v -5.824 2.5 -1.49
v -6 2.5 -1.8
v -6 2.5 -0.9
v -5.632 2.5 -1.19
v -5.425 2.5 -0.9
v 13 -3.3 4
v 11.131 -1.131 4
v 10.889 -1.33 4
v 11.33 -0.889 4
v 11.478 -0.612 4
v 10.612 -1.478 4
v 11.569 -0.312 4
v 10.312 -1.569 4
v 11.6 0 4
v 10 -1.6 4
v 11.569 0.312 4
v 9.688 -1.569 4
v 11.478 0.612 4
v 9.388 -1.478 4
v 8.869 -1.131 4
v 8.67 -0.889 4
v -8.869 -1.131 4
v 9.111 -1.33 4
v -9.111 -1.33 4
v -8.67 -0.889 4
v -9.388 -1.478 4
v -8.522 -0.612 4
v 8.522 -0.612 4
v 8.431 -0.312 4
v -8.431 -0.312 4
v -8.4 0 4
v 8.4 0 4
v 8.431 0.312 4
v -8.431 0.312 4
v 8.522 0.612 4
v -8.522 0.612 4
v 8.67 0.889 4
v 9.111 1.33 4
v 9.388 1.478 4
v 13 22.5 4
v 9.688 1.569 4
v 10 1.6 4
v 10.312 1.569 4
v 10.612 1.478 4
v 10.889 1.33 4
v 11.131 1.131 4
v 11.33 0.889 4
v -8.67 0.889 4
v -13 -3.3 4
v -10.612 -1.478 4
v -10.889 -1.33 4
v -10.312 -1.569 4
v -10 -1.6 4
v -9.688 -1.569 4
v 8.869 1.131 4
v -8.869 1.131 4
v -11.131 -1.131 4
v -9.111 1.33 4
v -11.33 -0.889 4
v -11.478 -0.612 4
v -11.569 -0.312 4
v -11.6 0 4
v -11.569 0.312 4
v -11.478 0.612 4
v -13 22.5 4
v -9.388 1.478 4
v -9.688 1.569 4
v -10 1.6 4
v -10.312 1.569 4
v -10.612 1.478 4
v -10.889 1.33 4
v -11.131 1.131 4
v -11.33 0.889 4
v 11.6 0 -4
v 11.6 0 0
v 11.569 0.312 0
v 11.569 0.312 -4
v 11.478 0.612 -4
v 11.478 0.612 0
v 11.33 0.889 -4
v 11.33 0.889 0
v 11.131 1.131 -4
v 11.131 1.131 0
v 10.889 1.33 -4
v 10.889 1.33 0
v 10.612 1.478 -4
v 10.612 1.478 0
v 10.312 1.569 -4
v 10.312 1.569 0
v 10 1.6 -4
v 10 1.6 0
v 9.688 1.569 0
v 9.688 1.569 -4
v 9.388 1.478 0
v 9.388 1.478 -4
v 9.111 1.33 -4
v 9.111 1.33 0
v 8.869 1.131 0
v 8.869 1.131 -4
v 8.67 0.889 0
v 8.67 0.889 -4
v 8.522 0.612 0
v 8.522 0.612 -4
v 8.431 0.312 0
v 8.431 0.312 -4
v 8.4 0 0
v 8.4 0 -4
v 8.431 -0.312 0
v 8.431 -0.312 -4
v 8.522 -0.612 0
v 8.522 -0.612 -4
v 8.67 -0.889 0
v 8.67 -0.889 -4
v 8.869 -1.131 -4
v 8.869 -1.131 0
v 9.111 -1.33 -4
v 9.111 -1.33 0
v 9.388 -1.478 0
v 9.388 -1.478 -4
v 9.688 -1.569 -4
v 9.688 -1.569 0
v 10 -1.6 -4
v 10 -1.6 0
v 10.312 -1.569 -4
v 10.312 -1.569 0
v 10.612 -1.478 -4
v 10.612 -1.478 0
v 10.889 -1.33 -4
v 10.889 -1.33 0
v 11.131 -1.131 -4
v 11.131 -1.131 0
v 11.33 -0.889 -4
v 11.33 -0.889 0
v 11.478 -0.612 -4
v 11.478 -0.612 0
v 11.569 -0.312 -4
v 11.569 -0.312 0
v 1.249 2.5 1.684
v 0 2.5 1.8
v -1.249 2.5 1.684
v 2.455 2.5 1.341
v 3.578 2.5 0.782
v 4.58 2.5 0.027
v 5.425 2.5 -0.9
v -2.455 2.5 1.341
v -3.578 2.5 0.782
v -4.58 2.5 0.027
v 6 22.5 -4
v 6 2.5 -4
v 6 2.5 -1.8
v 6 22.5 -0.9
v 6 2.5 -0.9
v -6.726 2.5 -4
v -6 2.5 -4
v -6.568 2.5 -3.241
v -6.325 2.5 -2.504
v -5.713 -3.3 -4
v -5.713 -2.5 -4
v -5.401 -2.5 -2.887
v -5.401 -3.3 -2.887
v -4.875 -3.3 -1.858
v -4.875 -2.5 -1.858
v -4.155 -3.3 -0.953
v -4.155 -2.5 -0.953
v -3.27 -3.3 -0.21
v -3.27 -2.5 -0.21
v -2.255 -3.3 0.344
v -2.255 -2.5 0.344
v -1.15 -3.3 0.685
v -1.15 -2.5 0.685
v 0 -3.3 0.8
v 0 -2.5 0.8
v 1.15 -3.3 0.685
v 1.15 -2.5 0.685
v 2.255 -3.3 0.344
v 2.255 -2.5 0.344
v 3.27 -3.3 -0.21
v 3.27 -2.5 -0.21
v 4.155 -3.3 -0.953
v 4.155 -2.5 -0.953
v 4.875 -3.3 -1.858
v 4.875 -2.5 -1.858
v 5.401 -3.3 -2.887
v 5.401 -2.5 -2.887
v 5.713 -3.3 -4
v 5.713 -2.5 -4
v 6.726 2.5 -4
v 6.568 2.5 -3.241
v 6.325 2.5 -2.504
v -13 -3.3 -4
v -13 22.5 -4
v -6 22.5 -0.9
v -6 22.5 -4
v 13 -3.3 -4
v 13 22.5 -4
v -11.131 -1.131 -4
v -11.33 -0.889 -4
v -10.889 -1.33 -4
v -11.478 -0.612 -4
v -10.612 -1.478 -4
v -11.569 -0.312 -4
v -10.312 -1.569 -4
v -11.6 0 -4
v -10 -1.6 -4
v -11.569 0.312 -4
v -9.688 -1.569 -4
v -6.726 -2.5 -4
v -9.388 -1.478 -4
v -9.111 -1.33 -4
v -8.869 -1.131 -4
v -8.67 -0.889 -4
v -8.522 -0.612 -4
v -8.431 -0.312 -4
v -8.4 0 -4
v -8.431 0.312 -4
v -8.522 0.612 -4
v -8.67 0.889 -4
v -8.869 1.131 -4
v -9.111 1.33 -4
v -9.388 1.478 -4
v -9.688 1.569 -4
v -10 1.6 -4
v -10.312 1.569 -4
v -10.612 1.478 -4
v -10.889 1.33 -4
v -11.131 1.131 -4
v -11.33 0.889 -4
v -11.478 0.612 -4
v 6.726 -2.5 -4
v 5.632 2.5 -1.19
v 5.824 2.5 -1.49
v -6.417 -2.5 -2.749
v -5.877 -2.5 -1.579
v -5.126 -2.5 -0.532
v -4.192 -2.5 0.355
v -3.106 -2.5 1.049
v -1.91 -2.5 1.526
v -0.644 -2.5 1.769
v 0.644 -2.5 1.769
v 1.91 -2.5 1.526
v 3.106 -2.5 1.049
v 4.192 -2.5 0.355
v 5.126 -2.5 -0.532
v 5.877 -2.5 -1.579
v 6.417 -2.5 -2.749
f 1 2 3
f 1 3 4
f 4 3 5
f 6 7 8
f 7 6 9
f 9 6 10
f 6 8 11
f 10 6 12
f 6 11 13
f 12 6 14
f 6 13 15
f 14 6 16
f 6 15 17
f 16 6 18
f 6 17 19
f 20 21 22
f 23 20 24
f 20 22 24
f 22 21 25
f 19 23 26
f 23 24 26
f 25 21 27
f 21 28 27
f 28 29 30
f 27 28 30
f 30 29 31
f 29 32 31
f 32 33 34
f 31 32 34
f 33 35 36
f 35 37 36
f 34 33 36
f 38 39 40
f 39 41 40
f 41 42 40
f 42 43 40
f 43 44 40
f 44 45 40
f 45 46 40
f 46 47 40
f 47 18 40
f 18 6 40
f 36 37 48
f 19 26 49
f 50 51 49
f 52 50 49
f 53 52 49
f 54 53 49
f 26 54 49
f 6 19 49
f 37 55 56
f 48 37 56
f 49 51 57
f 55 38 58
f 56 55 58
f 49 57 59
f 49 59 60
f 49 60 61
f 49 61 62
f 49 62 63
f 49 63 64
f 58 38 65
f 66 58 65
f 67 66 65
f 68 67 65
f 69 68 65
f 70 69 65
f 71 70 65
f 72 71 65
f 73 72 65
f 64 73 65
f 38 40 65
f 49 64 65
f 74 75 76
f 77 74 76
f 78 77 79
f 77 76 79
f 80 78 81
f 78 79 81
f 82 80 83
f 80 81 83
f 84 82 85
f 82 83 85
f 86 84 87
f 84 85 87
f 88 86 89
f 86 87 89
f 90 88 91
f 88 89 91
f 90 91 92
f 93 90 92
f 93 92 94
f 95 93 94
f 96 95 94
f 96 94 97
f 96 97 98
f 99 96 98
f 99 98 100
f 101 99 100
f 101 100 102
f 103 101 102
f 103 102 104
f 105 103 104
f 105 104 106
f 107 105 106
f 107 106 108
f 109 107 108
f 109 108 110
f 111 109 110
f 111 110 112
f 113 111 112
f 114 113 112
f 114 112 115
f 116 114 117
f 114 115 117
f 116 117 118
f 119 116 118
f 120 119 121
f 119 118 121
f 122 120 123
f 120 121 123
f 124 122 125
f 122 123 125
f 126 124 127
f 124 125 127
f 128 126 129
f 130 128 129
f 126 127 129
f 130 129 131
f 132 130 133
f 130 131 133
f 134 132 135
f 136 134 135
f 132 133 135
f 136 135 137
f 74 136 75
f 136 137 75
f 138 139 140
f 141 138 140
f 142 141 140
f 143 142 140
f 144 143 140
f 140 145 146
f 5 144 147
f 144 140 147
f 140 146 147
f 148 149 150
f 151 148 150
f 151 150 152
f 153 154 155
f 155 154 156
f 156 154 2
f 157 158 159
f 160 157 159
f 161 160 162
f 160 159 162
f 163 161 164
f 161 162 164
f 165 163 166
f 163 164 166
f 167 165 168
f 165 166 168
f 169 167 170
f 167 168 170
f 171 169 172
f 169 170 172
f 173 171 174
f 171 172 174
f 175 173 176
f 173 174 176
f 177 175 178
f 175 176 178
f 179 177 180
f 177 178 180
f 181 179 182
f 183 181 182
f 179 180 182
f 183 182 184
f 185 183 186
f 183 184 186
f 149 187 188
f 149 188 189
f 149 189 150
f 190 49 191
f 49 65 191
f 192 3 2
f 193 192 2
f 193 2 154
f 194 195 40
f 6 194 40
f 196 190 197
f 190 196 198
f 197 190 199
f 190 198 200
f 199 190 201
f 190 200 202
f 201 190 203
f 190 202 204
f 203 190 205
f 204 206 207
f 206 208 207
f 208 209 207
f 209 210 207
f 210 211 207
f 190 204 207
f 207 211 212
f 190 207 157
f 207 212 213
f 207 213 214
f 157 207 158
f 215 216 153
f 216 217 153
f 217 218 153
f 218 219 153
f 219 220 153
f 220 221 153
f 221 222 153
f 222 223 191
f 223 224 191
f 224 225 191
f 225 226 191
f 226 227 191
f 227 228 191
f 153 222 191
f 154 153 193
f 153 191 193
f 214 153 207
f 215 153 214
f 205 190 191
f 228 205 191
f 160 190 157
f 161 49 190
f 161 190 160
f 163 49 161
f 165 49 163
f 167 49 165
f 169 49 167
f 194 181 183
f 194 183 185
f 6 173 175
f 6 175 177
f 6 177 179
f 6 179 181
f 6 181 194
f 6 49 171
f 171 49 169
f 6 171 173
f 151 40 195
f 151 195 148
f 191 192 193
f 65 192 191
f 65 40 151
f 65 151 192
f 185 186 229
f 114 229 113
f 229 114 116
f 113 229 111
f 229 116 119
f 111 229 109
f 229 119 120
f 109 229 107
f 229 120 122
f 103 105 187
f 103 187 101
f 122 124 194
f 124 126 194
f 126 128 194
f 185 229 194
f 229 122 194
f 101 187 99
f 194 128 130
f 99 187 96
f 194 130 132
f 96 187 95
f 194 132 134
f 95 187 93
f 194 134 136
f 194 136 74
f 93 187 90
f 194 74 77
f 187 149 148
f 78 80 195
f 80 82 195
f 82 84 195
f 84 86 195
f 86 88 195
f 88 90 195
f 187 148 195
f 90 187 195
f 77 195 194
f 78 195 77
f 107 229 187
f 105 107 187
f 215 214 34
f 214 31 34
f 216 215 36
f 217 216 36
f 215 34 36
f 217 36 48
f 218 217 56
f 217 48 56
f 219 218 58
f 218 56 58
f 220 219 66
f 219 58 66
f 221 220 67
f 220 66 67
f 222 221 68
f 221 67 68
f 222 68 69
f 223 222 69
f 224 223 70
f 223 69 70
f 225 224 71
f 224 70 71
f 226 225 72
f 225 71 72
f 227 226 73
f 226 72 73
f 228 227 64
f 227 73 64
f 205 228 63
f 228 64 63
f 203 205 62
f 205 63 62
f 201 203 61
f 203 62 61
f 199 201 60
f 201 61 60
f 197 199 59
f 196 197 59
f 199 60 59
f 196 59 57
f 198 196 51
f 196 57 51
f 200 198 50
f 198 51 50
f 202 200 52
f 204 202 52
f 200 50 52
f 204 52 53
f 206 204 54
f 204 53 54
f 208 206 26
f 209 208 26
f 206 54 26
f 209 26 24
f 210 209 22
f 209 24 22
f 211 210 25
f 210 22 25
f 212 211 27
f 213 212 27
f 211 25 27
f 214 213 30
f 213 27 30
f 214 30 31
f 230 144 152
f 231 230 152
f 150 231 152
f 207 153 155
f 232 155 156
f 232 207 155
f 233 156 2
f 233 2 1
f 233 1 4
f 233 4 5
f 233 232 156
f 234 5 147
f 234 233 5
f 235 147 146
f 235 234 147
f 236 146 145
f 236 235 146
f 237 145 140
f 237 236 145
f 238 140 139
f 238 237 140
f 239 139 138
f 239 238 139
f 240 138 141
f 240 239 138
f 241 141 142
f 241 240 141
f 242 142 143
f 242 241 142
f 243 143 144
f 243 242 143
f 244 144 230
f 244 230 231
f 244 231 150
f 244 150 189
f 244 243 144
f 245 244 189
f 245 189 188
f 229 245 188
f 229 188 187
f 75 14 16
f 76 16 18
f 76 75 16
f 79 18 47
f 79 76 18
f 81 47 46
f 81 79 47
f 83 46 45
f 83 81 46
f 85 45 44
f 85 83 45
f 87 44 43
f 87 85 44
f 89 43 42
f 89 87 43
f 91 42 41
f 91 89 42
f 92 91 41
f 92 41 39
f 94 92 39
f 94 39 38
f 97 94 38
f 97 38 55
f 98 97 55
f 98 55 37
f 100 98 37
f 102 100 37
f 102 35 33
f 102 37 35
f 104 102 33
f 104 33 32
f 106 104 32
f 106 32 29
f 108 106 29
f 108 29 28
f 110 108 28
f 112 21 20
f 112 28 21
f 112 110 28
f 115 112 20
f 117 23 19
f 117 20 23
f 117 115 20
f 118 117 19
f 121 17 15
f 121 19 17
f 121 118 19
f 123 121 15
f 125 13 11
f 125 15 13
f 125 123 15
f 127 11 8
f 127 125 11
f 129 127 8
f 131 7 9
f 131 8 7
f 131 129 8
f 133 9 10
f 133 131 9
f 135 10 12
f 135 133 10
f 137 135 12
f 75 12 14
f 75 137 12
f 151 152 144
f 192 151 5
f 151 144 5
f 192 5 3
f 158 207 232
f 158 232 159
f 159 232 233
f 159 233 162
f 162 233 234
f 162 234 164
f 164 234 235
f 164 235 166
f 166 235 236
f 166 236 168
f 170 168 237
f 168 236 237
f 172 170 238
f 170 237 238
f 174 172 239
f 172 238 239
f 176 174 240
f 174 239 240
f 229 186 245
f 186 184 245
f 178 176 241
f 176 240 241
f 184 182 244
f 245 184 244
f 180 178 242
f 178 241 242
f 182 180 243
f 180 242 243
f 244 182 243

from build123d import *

# Parameters (mm, degrees)
F1_DEPTH = 2.5
F2_R     = 1.6
F3_DEPTH = 12.5
F6_DEPTH = 20
F9_DEPTH = 0.8


with BuildPart() as f1:
    # F0 (on Front) → F1 (new body, symmetric)
    with BuildSketch(Plane.XZ):
        with BuildLine():
            Line((13, 4), (-13, 4))
            Line((-13, 4), (-13, -4))
            Line((-13, -4), (-6.7260686883, -4))
            ThreePointArc((-6.7260686883, -4), (0, 1.8), (6.7260686883, -4))
            Line((6.7260686883, -4), (13, -4))
            Line((13, -4), (13, 4))
        make_face()
    extrude(amount=F1_DEPTH, both=True)

    # F2 (on Top) → F3 (cut, symmetric)
    with BuildSketch(Plane.XY):
        with Locations((10, 0)):
            Circle(F2_R)
        with Locations((-10, 0)):
            Circle(F2_R)
    extrude(amount=F3_DEPTH, both=True, mode=Mode.SUBTRACT)

    # F5 (on offset) → F6 (join)
    with BuildSketch(Plane(origin=(0, 2.5, 0), x_dir=(-1, 0, 0), z_dir=(0, 1, 0))):
        Polygon((13, 4), (-13, 4), (-13, -4), (-6, -4), (-6, -0.9), (6, -0.9), (6, -4), (13, -4), align=None)
    extrude(amount=F6_DEPTH)

    # F8 (on offset) → F9 (join)
    with BuildSketch(Plane.XZ.offset(2.5)):
        with BuildLine():
            Line((13, 4), (-13, 4))
            Line((-13, 4), (-13, -4))
            Line((-13, -4), (-5.7131427428, -4))
            ThreePointArc((-5.7131427428, -4), (0, 0.8), (5.7131427428, -4))
            Line((5.7131427428, -4), (13, -4))
            Line((13, -4), (13, 4))
        make_face()
    extrude(amount=F9_DEPTH)


solid = f1.part
